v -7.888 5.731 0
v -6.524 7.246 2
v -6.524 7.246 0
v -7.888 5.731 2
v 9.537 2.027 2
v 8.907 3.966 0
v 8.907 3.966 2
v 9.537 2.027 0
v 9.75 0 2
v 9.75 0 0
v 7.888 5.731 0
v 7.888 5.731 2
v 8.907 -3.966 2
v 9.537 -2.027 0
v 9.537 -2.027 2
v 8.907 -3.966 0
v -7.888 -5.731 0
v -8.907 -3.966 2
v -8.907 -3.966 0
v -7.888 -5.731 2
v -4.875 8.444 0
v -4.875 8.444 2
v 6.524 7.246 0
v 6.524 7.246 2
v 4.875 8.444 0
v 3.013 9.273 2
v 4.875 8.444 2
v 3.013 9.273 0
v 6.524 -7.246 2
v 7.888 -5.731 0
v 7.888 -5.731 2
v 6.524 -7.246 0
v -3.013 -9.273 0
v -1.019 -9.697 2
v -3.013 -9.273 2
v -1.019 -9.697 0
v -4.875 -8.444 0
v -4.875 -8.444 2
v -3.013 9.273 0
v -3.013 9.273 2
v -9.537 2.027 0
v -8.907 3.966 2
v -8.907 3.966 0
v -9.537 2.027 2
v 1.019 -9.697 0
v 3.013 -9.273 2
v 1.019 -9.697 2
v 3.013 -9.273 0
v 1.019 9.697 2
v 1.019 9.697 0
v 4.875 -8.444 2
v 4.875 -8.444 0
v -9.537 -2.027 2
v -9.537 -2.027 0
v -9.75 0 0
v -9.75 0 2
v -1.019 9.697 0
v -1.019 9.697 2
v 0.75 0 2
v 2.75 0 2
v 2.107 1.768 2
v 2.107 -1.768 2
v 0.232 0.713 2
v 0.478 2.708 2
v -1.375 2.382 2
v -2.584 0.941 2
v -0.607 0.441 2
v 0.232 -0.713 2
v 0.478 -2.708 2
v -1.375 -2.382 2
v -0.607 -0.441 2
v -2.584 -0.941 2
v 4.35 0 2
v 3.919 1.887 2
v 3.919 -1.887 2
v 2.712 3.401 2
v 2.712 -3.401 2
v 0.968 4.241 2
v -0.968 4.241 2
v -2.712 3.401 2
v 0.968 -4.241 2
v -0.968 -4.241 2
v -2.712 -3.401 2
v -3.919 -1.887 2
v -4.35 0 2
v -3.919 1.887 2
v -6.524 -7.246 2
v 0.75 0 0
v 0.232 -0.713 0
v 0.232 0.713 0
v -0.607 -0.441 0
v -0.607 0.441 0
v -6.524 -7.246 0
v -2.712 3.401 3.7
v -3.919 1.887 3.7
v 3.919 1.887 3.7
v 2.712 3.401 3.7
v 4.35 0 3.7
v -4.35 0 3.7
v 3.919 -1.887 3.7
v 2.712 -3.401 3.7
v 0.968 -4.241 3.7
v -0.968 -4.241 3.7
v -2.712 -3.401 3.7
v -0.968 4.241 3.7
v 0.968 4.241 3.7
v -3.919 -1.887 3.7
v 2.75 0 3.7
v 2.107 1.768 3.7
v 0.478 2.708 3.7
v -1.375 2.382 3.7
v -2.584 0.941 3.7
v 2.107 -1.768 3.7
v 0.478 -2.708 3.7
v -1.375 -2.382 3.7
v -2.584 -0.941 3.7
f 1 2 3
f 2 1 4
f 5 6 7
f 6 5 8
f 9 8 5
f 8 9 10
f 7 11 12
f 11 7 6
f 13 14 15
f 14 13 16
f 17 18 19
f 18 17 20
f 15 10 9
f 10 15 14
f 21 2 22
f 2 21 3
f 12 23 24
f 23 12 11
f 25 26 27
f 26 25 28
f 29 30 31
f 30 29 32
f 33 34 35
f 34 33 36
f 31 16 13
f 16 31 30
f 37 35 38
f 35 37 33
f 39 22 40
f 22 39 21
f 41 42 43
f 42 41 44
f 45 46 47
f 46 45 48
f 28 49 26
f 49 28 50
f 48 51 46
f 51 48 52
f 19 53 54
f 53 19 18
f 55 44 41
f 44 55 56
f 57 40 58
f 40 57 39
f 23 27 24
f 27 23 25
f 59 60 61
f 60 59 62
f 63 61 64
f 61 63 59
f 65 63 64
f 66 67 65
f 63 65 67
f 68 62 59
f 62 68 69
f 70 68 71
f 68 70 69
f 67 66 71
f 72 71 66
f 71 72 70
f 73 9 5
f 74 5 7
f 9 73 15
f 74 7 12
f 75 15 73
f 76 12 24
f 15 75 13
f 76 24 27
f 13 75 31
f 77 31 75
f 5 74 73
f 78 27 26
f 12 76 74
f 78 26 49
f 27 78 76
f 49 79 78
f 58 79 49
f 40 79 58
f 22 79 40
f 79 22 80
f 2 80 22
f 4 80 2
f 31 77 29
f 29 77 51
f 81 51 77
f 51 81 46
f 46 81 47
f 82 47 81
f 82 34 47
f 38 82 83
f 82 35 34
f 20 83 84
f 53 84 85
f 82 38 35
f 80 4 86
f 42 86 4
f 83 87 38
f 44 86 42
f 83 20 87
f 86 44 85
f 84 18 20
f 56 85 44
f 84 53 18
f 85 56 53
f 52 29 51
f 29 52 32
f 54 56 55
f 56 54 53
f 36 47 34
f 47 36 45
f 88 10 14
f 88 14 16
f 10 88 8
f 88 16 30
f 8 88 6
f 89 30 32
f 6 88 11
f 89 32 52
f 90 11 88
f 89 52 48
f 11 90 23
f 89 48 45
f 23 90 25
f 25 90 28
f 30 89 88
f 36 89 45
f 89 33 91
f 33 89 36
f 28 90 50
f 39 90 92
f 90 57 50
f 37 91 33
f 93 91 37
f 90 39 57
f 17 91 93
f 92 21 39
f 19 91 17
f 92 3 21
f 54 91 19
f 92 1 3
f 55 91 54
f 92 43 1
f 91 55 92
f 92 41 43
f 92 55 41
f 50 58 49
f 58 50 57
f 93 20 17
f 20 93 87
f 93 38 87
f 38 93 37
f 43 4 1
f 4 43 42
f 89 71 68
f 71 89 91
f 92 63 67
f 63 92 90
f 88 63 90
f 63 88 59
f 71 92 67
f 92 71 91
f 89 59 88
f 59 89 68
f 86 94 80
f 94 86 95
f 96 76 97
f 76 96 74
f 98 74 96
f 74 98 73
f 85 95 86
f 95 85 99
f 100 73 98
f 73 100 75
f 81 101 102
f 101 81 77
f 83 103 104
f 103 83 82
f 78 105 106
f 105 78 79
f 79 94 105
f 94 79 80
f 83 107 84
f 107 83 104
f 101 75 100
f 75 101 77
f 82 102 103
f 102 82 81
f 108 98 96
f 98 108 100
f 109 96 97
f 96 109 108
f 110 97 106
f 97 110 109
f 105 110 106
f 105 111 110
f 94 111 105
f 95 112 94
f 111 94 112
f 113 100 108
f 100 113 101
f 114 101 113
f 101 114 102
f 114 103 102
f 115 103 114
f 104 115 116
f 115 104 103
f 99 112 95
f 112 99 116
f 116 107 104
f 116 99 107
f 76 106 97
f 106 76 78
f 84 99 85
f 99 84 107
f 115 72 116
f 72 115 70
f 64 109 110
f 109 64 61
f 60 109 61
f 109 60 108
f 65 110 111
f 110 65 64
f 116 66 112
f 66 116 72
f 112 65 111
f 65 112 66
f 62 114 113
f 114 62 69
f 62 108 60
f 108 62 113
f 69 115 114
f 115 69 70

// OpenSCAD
module mock_servo_horn(diameter=19.5, body_height=2, hole_diameter=1.5, rear_diameter=8.7, rear_height=1.7, centre_hollow_diameter=5.5) {
  total_height = body_height + rear_height;
  holes_height = total_height + 2;

    difference() {
      cylinder(d=diameter, h=body_height); // Main body
      translate([0, 0, -1]) cylinder(d=hole_diameter, h=holes_height); // Centre hole
    }

    difference() {
      translate([0, 0, body_height]) cylinder(d=rear_diameter, h=rear_height); // Raised rear section
      translate([0, 0, 0.2]) cylinder(d=centre_hollow_diameter, h=total_height + 1); // Centre hollow, 0.2 is best guess thickness of front of horn inside hollow
    }
}

mock_servo_horn();
